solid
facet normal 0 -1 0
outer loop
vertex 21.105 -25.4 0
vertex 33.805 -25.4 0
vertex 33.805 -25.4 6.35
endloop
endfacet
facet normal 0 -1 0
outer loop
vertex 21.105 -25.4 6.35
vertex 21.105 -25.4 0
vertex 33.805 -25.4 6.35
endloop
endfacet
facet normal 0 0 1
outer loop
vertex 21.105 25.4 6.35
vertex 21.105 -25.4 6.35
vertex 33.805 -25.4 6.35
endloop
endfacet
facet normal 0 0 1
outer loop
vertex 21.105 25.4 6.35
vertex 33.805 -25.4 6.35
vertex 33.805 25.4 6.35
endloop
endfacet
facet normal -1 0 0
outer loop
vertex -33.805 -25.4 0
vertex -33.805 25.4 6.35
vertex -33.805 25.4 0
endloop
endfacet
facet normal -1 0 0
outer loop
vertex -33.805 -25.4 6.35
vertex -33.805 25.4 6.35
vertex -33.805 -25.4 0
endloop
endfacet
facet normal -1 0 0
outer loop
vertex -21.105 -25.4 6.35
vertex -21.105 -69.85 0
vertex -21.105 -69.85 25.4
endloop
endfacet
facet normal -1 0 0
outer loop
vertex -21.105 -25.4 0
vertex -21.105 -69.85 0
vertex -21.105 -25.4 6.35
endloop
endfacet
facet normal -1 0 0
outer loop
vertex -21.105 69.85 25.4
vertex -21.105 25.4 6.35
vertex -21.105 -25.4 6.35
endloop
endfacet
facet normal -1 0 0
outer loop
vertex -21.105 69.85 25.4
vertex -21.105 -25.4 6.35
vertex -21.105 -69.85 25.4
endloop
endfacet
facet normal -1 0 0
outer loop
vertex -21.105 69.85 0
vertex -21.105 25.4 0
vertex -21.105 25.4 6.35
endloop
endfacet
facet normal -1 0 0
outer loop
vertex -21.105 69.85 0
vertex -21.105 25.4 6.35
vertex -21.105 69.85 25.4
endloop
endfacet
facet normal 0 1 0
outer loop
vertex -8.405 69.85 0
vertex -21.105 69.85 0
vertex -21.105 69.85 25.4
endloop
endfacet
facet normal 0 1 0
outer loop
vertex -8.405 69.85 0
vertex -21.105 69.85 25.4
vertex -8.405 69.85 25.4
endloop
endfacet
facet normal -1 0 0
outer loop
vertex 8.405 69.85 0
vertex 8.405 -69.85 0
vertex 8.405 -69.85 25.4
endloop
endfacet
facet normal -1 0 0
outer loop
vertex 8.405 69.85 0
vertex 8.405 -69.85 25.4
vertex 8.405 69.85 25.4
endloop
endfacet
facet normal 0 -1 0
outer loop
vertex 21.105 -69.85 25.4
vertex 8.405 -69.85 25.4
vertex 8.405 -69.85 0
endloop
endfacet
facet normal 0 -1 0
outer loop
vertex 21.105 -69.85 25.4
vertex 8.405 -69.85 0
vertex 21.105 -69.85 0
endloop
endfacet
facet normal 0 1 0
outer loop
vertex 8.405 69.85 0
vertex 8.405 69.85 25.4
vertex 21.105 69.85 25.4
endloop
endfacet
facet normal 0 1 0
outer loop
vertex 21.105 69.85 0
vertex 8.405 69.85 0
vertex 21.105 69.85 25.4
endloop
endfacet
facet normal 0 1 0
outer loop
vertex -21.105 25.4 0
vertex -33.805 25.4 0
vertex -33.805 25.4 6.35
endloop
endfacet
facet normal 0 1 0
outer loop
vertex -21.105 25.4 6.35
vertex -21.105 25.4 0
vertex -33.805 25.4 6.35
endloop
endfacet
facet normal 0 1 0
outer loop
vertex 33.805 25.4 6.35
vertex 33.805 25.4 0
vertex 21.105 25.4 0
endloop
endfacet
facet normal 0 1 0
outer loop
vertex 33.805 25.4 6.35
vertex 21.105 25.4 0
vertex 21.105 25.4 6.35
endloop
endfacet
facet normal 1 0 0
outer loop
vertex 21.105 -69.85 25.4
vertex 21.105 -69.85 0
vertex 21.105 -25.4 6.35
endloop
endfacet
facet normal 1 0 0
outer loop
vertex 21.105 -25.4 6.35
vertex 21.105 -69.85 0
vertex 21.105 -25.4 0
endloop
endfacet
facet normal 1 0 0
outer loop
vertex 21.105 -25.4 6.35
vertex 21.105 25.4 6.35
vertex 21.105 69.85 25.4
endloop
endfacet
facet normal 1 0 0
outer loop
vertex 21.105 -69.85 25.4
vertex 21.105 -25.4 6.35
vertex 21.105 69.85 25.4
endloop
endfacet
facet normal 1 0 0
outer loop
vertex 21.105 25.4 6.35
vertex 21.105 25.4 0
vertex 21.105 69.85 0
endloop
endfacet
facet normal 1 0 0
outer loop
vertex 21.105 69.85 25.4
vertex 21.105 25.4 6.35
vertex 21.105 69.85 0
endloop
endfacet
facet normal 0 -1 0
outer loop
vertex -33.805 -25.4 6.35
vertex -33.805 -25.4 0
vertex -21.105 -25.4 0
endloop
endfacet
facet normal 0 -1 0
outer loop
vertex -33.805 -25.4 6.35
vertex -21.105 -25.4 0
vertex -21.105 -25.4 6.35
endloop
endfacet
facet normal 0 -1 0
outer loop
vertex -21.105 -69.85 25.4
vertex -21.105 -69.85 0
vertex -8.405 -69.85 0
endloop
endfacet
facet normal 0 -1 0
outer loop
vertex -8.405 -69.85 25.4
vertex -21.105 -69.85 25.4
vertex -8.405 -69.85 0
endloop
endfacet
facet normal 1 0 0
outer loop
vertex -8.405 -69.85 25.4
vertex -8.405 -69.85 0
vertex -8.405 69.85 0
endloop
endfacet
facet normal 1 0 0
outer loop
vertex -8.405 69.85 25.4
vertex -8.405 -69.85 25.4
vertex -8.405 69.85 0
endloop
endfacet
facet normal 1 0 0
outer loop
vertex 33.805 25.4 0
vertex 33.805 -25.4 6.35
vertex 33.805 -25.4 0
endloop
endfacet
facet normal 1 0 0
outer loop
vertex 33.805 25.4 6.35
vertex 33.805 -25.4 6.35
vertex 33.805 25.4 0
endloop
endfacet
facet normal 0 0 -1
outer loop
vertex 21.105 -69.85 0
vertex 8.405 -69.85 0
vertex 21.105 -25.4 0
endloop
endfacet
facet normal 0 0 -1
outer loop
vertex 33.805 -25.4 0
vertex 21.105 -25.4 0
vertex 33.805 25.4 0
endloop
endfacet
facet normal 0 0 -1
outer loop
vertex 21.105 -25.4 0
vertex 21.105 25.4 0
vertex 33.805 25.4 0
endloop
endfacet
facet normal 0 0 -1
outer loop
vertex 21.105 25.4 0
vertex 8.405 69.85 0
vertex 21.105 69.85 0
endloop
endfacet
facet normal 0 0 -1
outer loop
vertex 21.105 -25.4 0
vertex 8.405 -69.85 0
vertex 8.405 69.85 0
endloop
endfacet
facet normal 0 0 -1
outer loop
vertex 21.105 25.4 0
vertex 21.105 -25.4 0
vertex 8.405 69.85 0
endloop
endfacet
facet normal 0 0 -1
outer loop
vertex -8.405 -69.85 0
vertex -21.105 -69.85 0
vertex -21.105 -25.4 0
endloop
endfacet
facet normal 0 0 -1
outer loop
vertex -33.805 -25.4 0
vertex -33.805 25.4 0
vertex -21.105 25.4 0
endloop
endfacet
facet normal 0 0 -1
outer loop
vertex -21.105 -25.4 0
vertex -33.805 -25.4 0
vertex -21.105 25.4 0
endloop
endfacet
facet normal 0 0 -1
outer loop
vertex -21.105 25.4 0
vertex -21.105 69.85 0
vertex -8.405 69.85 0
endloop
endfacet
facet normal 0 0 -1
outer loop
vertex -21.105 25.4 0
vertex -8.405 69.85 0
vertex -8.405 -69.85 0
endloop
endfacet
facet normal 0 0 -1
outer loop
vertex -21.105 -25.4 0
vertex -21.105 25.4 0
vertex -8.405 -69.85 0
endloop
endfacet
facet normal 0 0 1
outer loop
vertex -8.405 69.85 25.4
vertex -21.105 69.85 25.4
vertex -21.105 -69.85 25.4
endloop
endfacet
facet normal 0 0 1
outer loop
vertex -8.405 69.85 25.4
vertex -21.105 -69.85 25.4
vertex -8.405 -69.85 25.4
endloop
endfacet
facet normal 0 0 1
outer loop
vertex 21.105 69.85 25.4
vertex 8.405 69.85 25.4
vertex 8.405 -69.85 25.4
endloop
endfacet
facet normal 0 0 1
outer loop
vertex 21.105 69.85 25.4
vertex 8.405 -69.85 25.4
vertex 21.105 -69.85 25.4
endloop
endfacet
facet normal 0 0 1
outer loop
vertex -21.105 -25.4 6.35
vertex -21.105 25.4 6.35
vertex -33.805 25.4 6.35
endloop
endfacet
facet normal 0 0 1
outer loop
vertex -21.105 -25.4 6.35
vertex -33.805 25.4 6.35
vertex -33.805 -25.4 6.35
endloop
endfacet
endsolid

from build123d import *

# Parameters (mm, degrees)
F0_W     = 12.7
F0_H     = 139.7
F1_DEPTH = 25.4
F2_W     = 50.8
F2_H     = 6.35
F4_DEPTH = 12.7
F3_W     = 50.8
F3_H     = 6.35
F5_DEPTH = 12.7


with BuildPart() as f1:
    # F0 (on Top) → F1 (new body)
    with BuildSketch(Plane.XY):
        with Locations((-14.755463, 0)):
            Rectangle(F0_W, F0_H)
        with Locations((14.755463, 0)):
            Rectangle(F0_W, F0_H)
    extrude(amount=F1_DEPTH)

    # F2 (on face) → F4 (join)
    with BuildSketch(Plane.YZ.offset(21.105463)):
        with Locations((0, 3.175)):
            Rectangle(F2_W, F2_H)
    extrude(amount=F4_DEPTH)

    # F3 (on face) → F5 (join)
    with BuildSketch(Plane(origin=(-21.105463, 0, 0), x_dir=(0, -1, 0), z_dir=(-1, 0, 0))):
        with Locations((0, 3.175)):
            Rectangle(F3_W, F3_H)
    extrude(amount=F5_DEPTH)


solid = f1.part
